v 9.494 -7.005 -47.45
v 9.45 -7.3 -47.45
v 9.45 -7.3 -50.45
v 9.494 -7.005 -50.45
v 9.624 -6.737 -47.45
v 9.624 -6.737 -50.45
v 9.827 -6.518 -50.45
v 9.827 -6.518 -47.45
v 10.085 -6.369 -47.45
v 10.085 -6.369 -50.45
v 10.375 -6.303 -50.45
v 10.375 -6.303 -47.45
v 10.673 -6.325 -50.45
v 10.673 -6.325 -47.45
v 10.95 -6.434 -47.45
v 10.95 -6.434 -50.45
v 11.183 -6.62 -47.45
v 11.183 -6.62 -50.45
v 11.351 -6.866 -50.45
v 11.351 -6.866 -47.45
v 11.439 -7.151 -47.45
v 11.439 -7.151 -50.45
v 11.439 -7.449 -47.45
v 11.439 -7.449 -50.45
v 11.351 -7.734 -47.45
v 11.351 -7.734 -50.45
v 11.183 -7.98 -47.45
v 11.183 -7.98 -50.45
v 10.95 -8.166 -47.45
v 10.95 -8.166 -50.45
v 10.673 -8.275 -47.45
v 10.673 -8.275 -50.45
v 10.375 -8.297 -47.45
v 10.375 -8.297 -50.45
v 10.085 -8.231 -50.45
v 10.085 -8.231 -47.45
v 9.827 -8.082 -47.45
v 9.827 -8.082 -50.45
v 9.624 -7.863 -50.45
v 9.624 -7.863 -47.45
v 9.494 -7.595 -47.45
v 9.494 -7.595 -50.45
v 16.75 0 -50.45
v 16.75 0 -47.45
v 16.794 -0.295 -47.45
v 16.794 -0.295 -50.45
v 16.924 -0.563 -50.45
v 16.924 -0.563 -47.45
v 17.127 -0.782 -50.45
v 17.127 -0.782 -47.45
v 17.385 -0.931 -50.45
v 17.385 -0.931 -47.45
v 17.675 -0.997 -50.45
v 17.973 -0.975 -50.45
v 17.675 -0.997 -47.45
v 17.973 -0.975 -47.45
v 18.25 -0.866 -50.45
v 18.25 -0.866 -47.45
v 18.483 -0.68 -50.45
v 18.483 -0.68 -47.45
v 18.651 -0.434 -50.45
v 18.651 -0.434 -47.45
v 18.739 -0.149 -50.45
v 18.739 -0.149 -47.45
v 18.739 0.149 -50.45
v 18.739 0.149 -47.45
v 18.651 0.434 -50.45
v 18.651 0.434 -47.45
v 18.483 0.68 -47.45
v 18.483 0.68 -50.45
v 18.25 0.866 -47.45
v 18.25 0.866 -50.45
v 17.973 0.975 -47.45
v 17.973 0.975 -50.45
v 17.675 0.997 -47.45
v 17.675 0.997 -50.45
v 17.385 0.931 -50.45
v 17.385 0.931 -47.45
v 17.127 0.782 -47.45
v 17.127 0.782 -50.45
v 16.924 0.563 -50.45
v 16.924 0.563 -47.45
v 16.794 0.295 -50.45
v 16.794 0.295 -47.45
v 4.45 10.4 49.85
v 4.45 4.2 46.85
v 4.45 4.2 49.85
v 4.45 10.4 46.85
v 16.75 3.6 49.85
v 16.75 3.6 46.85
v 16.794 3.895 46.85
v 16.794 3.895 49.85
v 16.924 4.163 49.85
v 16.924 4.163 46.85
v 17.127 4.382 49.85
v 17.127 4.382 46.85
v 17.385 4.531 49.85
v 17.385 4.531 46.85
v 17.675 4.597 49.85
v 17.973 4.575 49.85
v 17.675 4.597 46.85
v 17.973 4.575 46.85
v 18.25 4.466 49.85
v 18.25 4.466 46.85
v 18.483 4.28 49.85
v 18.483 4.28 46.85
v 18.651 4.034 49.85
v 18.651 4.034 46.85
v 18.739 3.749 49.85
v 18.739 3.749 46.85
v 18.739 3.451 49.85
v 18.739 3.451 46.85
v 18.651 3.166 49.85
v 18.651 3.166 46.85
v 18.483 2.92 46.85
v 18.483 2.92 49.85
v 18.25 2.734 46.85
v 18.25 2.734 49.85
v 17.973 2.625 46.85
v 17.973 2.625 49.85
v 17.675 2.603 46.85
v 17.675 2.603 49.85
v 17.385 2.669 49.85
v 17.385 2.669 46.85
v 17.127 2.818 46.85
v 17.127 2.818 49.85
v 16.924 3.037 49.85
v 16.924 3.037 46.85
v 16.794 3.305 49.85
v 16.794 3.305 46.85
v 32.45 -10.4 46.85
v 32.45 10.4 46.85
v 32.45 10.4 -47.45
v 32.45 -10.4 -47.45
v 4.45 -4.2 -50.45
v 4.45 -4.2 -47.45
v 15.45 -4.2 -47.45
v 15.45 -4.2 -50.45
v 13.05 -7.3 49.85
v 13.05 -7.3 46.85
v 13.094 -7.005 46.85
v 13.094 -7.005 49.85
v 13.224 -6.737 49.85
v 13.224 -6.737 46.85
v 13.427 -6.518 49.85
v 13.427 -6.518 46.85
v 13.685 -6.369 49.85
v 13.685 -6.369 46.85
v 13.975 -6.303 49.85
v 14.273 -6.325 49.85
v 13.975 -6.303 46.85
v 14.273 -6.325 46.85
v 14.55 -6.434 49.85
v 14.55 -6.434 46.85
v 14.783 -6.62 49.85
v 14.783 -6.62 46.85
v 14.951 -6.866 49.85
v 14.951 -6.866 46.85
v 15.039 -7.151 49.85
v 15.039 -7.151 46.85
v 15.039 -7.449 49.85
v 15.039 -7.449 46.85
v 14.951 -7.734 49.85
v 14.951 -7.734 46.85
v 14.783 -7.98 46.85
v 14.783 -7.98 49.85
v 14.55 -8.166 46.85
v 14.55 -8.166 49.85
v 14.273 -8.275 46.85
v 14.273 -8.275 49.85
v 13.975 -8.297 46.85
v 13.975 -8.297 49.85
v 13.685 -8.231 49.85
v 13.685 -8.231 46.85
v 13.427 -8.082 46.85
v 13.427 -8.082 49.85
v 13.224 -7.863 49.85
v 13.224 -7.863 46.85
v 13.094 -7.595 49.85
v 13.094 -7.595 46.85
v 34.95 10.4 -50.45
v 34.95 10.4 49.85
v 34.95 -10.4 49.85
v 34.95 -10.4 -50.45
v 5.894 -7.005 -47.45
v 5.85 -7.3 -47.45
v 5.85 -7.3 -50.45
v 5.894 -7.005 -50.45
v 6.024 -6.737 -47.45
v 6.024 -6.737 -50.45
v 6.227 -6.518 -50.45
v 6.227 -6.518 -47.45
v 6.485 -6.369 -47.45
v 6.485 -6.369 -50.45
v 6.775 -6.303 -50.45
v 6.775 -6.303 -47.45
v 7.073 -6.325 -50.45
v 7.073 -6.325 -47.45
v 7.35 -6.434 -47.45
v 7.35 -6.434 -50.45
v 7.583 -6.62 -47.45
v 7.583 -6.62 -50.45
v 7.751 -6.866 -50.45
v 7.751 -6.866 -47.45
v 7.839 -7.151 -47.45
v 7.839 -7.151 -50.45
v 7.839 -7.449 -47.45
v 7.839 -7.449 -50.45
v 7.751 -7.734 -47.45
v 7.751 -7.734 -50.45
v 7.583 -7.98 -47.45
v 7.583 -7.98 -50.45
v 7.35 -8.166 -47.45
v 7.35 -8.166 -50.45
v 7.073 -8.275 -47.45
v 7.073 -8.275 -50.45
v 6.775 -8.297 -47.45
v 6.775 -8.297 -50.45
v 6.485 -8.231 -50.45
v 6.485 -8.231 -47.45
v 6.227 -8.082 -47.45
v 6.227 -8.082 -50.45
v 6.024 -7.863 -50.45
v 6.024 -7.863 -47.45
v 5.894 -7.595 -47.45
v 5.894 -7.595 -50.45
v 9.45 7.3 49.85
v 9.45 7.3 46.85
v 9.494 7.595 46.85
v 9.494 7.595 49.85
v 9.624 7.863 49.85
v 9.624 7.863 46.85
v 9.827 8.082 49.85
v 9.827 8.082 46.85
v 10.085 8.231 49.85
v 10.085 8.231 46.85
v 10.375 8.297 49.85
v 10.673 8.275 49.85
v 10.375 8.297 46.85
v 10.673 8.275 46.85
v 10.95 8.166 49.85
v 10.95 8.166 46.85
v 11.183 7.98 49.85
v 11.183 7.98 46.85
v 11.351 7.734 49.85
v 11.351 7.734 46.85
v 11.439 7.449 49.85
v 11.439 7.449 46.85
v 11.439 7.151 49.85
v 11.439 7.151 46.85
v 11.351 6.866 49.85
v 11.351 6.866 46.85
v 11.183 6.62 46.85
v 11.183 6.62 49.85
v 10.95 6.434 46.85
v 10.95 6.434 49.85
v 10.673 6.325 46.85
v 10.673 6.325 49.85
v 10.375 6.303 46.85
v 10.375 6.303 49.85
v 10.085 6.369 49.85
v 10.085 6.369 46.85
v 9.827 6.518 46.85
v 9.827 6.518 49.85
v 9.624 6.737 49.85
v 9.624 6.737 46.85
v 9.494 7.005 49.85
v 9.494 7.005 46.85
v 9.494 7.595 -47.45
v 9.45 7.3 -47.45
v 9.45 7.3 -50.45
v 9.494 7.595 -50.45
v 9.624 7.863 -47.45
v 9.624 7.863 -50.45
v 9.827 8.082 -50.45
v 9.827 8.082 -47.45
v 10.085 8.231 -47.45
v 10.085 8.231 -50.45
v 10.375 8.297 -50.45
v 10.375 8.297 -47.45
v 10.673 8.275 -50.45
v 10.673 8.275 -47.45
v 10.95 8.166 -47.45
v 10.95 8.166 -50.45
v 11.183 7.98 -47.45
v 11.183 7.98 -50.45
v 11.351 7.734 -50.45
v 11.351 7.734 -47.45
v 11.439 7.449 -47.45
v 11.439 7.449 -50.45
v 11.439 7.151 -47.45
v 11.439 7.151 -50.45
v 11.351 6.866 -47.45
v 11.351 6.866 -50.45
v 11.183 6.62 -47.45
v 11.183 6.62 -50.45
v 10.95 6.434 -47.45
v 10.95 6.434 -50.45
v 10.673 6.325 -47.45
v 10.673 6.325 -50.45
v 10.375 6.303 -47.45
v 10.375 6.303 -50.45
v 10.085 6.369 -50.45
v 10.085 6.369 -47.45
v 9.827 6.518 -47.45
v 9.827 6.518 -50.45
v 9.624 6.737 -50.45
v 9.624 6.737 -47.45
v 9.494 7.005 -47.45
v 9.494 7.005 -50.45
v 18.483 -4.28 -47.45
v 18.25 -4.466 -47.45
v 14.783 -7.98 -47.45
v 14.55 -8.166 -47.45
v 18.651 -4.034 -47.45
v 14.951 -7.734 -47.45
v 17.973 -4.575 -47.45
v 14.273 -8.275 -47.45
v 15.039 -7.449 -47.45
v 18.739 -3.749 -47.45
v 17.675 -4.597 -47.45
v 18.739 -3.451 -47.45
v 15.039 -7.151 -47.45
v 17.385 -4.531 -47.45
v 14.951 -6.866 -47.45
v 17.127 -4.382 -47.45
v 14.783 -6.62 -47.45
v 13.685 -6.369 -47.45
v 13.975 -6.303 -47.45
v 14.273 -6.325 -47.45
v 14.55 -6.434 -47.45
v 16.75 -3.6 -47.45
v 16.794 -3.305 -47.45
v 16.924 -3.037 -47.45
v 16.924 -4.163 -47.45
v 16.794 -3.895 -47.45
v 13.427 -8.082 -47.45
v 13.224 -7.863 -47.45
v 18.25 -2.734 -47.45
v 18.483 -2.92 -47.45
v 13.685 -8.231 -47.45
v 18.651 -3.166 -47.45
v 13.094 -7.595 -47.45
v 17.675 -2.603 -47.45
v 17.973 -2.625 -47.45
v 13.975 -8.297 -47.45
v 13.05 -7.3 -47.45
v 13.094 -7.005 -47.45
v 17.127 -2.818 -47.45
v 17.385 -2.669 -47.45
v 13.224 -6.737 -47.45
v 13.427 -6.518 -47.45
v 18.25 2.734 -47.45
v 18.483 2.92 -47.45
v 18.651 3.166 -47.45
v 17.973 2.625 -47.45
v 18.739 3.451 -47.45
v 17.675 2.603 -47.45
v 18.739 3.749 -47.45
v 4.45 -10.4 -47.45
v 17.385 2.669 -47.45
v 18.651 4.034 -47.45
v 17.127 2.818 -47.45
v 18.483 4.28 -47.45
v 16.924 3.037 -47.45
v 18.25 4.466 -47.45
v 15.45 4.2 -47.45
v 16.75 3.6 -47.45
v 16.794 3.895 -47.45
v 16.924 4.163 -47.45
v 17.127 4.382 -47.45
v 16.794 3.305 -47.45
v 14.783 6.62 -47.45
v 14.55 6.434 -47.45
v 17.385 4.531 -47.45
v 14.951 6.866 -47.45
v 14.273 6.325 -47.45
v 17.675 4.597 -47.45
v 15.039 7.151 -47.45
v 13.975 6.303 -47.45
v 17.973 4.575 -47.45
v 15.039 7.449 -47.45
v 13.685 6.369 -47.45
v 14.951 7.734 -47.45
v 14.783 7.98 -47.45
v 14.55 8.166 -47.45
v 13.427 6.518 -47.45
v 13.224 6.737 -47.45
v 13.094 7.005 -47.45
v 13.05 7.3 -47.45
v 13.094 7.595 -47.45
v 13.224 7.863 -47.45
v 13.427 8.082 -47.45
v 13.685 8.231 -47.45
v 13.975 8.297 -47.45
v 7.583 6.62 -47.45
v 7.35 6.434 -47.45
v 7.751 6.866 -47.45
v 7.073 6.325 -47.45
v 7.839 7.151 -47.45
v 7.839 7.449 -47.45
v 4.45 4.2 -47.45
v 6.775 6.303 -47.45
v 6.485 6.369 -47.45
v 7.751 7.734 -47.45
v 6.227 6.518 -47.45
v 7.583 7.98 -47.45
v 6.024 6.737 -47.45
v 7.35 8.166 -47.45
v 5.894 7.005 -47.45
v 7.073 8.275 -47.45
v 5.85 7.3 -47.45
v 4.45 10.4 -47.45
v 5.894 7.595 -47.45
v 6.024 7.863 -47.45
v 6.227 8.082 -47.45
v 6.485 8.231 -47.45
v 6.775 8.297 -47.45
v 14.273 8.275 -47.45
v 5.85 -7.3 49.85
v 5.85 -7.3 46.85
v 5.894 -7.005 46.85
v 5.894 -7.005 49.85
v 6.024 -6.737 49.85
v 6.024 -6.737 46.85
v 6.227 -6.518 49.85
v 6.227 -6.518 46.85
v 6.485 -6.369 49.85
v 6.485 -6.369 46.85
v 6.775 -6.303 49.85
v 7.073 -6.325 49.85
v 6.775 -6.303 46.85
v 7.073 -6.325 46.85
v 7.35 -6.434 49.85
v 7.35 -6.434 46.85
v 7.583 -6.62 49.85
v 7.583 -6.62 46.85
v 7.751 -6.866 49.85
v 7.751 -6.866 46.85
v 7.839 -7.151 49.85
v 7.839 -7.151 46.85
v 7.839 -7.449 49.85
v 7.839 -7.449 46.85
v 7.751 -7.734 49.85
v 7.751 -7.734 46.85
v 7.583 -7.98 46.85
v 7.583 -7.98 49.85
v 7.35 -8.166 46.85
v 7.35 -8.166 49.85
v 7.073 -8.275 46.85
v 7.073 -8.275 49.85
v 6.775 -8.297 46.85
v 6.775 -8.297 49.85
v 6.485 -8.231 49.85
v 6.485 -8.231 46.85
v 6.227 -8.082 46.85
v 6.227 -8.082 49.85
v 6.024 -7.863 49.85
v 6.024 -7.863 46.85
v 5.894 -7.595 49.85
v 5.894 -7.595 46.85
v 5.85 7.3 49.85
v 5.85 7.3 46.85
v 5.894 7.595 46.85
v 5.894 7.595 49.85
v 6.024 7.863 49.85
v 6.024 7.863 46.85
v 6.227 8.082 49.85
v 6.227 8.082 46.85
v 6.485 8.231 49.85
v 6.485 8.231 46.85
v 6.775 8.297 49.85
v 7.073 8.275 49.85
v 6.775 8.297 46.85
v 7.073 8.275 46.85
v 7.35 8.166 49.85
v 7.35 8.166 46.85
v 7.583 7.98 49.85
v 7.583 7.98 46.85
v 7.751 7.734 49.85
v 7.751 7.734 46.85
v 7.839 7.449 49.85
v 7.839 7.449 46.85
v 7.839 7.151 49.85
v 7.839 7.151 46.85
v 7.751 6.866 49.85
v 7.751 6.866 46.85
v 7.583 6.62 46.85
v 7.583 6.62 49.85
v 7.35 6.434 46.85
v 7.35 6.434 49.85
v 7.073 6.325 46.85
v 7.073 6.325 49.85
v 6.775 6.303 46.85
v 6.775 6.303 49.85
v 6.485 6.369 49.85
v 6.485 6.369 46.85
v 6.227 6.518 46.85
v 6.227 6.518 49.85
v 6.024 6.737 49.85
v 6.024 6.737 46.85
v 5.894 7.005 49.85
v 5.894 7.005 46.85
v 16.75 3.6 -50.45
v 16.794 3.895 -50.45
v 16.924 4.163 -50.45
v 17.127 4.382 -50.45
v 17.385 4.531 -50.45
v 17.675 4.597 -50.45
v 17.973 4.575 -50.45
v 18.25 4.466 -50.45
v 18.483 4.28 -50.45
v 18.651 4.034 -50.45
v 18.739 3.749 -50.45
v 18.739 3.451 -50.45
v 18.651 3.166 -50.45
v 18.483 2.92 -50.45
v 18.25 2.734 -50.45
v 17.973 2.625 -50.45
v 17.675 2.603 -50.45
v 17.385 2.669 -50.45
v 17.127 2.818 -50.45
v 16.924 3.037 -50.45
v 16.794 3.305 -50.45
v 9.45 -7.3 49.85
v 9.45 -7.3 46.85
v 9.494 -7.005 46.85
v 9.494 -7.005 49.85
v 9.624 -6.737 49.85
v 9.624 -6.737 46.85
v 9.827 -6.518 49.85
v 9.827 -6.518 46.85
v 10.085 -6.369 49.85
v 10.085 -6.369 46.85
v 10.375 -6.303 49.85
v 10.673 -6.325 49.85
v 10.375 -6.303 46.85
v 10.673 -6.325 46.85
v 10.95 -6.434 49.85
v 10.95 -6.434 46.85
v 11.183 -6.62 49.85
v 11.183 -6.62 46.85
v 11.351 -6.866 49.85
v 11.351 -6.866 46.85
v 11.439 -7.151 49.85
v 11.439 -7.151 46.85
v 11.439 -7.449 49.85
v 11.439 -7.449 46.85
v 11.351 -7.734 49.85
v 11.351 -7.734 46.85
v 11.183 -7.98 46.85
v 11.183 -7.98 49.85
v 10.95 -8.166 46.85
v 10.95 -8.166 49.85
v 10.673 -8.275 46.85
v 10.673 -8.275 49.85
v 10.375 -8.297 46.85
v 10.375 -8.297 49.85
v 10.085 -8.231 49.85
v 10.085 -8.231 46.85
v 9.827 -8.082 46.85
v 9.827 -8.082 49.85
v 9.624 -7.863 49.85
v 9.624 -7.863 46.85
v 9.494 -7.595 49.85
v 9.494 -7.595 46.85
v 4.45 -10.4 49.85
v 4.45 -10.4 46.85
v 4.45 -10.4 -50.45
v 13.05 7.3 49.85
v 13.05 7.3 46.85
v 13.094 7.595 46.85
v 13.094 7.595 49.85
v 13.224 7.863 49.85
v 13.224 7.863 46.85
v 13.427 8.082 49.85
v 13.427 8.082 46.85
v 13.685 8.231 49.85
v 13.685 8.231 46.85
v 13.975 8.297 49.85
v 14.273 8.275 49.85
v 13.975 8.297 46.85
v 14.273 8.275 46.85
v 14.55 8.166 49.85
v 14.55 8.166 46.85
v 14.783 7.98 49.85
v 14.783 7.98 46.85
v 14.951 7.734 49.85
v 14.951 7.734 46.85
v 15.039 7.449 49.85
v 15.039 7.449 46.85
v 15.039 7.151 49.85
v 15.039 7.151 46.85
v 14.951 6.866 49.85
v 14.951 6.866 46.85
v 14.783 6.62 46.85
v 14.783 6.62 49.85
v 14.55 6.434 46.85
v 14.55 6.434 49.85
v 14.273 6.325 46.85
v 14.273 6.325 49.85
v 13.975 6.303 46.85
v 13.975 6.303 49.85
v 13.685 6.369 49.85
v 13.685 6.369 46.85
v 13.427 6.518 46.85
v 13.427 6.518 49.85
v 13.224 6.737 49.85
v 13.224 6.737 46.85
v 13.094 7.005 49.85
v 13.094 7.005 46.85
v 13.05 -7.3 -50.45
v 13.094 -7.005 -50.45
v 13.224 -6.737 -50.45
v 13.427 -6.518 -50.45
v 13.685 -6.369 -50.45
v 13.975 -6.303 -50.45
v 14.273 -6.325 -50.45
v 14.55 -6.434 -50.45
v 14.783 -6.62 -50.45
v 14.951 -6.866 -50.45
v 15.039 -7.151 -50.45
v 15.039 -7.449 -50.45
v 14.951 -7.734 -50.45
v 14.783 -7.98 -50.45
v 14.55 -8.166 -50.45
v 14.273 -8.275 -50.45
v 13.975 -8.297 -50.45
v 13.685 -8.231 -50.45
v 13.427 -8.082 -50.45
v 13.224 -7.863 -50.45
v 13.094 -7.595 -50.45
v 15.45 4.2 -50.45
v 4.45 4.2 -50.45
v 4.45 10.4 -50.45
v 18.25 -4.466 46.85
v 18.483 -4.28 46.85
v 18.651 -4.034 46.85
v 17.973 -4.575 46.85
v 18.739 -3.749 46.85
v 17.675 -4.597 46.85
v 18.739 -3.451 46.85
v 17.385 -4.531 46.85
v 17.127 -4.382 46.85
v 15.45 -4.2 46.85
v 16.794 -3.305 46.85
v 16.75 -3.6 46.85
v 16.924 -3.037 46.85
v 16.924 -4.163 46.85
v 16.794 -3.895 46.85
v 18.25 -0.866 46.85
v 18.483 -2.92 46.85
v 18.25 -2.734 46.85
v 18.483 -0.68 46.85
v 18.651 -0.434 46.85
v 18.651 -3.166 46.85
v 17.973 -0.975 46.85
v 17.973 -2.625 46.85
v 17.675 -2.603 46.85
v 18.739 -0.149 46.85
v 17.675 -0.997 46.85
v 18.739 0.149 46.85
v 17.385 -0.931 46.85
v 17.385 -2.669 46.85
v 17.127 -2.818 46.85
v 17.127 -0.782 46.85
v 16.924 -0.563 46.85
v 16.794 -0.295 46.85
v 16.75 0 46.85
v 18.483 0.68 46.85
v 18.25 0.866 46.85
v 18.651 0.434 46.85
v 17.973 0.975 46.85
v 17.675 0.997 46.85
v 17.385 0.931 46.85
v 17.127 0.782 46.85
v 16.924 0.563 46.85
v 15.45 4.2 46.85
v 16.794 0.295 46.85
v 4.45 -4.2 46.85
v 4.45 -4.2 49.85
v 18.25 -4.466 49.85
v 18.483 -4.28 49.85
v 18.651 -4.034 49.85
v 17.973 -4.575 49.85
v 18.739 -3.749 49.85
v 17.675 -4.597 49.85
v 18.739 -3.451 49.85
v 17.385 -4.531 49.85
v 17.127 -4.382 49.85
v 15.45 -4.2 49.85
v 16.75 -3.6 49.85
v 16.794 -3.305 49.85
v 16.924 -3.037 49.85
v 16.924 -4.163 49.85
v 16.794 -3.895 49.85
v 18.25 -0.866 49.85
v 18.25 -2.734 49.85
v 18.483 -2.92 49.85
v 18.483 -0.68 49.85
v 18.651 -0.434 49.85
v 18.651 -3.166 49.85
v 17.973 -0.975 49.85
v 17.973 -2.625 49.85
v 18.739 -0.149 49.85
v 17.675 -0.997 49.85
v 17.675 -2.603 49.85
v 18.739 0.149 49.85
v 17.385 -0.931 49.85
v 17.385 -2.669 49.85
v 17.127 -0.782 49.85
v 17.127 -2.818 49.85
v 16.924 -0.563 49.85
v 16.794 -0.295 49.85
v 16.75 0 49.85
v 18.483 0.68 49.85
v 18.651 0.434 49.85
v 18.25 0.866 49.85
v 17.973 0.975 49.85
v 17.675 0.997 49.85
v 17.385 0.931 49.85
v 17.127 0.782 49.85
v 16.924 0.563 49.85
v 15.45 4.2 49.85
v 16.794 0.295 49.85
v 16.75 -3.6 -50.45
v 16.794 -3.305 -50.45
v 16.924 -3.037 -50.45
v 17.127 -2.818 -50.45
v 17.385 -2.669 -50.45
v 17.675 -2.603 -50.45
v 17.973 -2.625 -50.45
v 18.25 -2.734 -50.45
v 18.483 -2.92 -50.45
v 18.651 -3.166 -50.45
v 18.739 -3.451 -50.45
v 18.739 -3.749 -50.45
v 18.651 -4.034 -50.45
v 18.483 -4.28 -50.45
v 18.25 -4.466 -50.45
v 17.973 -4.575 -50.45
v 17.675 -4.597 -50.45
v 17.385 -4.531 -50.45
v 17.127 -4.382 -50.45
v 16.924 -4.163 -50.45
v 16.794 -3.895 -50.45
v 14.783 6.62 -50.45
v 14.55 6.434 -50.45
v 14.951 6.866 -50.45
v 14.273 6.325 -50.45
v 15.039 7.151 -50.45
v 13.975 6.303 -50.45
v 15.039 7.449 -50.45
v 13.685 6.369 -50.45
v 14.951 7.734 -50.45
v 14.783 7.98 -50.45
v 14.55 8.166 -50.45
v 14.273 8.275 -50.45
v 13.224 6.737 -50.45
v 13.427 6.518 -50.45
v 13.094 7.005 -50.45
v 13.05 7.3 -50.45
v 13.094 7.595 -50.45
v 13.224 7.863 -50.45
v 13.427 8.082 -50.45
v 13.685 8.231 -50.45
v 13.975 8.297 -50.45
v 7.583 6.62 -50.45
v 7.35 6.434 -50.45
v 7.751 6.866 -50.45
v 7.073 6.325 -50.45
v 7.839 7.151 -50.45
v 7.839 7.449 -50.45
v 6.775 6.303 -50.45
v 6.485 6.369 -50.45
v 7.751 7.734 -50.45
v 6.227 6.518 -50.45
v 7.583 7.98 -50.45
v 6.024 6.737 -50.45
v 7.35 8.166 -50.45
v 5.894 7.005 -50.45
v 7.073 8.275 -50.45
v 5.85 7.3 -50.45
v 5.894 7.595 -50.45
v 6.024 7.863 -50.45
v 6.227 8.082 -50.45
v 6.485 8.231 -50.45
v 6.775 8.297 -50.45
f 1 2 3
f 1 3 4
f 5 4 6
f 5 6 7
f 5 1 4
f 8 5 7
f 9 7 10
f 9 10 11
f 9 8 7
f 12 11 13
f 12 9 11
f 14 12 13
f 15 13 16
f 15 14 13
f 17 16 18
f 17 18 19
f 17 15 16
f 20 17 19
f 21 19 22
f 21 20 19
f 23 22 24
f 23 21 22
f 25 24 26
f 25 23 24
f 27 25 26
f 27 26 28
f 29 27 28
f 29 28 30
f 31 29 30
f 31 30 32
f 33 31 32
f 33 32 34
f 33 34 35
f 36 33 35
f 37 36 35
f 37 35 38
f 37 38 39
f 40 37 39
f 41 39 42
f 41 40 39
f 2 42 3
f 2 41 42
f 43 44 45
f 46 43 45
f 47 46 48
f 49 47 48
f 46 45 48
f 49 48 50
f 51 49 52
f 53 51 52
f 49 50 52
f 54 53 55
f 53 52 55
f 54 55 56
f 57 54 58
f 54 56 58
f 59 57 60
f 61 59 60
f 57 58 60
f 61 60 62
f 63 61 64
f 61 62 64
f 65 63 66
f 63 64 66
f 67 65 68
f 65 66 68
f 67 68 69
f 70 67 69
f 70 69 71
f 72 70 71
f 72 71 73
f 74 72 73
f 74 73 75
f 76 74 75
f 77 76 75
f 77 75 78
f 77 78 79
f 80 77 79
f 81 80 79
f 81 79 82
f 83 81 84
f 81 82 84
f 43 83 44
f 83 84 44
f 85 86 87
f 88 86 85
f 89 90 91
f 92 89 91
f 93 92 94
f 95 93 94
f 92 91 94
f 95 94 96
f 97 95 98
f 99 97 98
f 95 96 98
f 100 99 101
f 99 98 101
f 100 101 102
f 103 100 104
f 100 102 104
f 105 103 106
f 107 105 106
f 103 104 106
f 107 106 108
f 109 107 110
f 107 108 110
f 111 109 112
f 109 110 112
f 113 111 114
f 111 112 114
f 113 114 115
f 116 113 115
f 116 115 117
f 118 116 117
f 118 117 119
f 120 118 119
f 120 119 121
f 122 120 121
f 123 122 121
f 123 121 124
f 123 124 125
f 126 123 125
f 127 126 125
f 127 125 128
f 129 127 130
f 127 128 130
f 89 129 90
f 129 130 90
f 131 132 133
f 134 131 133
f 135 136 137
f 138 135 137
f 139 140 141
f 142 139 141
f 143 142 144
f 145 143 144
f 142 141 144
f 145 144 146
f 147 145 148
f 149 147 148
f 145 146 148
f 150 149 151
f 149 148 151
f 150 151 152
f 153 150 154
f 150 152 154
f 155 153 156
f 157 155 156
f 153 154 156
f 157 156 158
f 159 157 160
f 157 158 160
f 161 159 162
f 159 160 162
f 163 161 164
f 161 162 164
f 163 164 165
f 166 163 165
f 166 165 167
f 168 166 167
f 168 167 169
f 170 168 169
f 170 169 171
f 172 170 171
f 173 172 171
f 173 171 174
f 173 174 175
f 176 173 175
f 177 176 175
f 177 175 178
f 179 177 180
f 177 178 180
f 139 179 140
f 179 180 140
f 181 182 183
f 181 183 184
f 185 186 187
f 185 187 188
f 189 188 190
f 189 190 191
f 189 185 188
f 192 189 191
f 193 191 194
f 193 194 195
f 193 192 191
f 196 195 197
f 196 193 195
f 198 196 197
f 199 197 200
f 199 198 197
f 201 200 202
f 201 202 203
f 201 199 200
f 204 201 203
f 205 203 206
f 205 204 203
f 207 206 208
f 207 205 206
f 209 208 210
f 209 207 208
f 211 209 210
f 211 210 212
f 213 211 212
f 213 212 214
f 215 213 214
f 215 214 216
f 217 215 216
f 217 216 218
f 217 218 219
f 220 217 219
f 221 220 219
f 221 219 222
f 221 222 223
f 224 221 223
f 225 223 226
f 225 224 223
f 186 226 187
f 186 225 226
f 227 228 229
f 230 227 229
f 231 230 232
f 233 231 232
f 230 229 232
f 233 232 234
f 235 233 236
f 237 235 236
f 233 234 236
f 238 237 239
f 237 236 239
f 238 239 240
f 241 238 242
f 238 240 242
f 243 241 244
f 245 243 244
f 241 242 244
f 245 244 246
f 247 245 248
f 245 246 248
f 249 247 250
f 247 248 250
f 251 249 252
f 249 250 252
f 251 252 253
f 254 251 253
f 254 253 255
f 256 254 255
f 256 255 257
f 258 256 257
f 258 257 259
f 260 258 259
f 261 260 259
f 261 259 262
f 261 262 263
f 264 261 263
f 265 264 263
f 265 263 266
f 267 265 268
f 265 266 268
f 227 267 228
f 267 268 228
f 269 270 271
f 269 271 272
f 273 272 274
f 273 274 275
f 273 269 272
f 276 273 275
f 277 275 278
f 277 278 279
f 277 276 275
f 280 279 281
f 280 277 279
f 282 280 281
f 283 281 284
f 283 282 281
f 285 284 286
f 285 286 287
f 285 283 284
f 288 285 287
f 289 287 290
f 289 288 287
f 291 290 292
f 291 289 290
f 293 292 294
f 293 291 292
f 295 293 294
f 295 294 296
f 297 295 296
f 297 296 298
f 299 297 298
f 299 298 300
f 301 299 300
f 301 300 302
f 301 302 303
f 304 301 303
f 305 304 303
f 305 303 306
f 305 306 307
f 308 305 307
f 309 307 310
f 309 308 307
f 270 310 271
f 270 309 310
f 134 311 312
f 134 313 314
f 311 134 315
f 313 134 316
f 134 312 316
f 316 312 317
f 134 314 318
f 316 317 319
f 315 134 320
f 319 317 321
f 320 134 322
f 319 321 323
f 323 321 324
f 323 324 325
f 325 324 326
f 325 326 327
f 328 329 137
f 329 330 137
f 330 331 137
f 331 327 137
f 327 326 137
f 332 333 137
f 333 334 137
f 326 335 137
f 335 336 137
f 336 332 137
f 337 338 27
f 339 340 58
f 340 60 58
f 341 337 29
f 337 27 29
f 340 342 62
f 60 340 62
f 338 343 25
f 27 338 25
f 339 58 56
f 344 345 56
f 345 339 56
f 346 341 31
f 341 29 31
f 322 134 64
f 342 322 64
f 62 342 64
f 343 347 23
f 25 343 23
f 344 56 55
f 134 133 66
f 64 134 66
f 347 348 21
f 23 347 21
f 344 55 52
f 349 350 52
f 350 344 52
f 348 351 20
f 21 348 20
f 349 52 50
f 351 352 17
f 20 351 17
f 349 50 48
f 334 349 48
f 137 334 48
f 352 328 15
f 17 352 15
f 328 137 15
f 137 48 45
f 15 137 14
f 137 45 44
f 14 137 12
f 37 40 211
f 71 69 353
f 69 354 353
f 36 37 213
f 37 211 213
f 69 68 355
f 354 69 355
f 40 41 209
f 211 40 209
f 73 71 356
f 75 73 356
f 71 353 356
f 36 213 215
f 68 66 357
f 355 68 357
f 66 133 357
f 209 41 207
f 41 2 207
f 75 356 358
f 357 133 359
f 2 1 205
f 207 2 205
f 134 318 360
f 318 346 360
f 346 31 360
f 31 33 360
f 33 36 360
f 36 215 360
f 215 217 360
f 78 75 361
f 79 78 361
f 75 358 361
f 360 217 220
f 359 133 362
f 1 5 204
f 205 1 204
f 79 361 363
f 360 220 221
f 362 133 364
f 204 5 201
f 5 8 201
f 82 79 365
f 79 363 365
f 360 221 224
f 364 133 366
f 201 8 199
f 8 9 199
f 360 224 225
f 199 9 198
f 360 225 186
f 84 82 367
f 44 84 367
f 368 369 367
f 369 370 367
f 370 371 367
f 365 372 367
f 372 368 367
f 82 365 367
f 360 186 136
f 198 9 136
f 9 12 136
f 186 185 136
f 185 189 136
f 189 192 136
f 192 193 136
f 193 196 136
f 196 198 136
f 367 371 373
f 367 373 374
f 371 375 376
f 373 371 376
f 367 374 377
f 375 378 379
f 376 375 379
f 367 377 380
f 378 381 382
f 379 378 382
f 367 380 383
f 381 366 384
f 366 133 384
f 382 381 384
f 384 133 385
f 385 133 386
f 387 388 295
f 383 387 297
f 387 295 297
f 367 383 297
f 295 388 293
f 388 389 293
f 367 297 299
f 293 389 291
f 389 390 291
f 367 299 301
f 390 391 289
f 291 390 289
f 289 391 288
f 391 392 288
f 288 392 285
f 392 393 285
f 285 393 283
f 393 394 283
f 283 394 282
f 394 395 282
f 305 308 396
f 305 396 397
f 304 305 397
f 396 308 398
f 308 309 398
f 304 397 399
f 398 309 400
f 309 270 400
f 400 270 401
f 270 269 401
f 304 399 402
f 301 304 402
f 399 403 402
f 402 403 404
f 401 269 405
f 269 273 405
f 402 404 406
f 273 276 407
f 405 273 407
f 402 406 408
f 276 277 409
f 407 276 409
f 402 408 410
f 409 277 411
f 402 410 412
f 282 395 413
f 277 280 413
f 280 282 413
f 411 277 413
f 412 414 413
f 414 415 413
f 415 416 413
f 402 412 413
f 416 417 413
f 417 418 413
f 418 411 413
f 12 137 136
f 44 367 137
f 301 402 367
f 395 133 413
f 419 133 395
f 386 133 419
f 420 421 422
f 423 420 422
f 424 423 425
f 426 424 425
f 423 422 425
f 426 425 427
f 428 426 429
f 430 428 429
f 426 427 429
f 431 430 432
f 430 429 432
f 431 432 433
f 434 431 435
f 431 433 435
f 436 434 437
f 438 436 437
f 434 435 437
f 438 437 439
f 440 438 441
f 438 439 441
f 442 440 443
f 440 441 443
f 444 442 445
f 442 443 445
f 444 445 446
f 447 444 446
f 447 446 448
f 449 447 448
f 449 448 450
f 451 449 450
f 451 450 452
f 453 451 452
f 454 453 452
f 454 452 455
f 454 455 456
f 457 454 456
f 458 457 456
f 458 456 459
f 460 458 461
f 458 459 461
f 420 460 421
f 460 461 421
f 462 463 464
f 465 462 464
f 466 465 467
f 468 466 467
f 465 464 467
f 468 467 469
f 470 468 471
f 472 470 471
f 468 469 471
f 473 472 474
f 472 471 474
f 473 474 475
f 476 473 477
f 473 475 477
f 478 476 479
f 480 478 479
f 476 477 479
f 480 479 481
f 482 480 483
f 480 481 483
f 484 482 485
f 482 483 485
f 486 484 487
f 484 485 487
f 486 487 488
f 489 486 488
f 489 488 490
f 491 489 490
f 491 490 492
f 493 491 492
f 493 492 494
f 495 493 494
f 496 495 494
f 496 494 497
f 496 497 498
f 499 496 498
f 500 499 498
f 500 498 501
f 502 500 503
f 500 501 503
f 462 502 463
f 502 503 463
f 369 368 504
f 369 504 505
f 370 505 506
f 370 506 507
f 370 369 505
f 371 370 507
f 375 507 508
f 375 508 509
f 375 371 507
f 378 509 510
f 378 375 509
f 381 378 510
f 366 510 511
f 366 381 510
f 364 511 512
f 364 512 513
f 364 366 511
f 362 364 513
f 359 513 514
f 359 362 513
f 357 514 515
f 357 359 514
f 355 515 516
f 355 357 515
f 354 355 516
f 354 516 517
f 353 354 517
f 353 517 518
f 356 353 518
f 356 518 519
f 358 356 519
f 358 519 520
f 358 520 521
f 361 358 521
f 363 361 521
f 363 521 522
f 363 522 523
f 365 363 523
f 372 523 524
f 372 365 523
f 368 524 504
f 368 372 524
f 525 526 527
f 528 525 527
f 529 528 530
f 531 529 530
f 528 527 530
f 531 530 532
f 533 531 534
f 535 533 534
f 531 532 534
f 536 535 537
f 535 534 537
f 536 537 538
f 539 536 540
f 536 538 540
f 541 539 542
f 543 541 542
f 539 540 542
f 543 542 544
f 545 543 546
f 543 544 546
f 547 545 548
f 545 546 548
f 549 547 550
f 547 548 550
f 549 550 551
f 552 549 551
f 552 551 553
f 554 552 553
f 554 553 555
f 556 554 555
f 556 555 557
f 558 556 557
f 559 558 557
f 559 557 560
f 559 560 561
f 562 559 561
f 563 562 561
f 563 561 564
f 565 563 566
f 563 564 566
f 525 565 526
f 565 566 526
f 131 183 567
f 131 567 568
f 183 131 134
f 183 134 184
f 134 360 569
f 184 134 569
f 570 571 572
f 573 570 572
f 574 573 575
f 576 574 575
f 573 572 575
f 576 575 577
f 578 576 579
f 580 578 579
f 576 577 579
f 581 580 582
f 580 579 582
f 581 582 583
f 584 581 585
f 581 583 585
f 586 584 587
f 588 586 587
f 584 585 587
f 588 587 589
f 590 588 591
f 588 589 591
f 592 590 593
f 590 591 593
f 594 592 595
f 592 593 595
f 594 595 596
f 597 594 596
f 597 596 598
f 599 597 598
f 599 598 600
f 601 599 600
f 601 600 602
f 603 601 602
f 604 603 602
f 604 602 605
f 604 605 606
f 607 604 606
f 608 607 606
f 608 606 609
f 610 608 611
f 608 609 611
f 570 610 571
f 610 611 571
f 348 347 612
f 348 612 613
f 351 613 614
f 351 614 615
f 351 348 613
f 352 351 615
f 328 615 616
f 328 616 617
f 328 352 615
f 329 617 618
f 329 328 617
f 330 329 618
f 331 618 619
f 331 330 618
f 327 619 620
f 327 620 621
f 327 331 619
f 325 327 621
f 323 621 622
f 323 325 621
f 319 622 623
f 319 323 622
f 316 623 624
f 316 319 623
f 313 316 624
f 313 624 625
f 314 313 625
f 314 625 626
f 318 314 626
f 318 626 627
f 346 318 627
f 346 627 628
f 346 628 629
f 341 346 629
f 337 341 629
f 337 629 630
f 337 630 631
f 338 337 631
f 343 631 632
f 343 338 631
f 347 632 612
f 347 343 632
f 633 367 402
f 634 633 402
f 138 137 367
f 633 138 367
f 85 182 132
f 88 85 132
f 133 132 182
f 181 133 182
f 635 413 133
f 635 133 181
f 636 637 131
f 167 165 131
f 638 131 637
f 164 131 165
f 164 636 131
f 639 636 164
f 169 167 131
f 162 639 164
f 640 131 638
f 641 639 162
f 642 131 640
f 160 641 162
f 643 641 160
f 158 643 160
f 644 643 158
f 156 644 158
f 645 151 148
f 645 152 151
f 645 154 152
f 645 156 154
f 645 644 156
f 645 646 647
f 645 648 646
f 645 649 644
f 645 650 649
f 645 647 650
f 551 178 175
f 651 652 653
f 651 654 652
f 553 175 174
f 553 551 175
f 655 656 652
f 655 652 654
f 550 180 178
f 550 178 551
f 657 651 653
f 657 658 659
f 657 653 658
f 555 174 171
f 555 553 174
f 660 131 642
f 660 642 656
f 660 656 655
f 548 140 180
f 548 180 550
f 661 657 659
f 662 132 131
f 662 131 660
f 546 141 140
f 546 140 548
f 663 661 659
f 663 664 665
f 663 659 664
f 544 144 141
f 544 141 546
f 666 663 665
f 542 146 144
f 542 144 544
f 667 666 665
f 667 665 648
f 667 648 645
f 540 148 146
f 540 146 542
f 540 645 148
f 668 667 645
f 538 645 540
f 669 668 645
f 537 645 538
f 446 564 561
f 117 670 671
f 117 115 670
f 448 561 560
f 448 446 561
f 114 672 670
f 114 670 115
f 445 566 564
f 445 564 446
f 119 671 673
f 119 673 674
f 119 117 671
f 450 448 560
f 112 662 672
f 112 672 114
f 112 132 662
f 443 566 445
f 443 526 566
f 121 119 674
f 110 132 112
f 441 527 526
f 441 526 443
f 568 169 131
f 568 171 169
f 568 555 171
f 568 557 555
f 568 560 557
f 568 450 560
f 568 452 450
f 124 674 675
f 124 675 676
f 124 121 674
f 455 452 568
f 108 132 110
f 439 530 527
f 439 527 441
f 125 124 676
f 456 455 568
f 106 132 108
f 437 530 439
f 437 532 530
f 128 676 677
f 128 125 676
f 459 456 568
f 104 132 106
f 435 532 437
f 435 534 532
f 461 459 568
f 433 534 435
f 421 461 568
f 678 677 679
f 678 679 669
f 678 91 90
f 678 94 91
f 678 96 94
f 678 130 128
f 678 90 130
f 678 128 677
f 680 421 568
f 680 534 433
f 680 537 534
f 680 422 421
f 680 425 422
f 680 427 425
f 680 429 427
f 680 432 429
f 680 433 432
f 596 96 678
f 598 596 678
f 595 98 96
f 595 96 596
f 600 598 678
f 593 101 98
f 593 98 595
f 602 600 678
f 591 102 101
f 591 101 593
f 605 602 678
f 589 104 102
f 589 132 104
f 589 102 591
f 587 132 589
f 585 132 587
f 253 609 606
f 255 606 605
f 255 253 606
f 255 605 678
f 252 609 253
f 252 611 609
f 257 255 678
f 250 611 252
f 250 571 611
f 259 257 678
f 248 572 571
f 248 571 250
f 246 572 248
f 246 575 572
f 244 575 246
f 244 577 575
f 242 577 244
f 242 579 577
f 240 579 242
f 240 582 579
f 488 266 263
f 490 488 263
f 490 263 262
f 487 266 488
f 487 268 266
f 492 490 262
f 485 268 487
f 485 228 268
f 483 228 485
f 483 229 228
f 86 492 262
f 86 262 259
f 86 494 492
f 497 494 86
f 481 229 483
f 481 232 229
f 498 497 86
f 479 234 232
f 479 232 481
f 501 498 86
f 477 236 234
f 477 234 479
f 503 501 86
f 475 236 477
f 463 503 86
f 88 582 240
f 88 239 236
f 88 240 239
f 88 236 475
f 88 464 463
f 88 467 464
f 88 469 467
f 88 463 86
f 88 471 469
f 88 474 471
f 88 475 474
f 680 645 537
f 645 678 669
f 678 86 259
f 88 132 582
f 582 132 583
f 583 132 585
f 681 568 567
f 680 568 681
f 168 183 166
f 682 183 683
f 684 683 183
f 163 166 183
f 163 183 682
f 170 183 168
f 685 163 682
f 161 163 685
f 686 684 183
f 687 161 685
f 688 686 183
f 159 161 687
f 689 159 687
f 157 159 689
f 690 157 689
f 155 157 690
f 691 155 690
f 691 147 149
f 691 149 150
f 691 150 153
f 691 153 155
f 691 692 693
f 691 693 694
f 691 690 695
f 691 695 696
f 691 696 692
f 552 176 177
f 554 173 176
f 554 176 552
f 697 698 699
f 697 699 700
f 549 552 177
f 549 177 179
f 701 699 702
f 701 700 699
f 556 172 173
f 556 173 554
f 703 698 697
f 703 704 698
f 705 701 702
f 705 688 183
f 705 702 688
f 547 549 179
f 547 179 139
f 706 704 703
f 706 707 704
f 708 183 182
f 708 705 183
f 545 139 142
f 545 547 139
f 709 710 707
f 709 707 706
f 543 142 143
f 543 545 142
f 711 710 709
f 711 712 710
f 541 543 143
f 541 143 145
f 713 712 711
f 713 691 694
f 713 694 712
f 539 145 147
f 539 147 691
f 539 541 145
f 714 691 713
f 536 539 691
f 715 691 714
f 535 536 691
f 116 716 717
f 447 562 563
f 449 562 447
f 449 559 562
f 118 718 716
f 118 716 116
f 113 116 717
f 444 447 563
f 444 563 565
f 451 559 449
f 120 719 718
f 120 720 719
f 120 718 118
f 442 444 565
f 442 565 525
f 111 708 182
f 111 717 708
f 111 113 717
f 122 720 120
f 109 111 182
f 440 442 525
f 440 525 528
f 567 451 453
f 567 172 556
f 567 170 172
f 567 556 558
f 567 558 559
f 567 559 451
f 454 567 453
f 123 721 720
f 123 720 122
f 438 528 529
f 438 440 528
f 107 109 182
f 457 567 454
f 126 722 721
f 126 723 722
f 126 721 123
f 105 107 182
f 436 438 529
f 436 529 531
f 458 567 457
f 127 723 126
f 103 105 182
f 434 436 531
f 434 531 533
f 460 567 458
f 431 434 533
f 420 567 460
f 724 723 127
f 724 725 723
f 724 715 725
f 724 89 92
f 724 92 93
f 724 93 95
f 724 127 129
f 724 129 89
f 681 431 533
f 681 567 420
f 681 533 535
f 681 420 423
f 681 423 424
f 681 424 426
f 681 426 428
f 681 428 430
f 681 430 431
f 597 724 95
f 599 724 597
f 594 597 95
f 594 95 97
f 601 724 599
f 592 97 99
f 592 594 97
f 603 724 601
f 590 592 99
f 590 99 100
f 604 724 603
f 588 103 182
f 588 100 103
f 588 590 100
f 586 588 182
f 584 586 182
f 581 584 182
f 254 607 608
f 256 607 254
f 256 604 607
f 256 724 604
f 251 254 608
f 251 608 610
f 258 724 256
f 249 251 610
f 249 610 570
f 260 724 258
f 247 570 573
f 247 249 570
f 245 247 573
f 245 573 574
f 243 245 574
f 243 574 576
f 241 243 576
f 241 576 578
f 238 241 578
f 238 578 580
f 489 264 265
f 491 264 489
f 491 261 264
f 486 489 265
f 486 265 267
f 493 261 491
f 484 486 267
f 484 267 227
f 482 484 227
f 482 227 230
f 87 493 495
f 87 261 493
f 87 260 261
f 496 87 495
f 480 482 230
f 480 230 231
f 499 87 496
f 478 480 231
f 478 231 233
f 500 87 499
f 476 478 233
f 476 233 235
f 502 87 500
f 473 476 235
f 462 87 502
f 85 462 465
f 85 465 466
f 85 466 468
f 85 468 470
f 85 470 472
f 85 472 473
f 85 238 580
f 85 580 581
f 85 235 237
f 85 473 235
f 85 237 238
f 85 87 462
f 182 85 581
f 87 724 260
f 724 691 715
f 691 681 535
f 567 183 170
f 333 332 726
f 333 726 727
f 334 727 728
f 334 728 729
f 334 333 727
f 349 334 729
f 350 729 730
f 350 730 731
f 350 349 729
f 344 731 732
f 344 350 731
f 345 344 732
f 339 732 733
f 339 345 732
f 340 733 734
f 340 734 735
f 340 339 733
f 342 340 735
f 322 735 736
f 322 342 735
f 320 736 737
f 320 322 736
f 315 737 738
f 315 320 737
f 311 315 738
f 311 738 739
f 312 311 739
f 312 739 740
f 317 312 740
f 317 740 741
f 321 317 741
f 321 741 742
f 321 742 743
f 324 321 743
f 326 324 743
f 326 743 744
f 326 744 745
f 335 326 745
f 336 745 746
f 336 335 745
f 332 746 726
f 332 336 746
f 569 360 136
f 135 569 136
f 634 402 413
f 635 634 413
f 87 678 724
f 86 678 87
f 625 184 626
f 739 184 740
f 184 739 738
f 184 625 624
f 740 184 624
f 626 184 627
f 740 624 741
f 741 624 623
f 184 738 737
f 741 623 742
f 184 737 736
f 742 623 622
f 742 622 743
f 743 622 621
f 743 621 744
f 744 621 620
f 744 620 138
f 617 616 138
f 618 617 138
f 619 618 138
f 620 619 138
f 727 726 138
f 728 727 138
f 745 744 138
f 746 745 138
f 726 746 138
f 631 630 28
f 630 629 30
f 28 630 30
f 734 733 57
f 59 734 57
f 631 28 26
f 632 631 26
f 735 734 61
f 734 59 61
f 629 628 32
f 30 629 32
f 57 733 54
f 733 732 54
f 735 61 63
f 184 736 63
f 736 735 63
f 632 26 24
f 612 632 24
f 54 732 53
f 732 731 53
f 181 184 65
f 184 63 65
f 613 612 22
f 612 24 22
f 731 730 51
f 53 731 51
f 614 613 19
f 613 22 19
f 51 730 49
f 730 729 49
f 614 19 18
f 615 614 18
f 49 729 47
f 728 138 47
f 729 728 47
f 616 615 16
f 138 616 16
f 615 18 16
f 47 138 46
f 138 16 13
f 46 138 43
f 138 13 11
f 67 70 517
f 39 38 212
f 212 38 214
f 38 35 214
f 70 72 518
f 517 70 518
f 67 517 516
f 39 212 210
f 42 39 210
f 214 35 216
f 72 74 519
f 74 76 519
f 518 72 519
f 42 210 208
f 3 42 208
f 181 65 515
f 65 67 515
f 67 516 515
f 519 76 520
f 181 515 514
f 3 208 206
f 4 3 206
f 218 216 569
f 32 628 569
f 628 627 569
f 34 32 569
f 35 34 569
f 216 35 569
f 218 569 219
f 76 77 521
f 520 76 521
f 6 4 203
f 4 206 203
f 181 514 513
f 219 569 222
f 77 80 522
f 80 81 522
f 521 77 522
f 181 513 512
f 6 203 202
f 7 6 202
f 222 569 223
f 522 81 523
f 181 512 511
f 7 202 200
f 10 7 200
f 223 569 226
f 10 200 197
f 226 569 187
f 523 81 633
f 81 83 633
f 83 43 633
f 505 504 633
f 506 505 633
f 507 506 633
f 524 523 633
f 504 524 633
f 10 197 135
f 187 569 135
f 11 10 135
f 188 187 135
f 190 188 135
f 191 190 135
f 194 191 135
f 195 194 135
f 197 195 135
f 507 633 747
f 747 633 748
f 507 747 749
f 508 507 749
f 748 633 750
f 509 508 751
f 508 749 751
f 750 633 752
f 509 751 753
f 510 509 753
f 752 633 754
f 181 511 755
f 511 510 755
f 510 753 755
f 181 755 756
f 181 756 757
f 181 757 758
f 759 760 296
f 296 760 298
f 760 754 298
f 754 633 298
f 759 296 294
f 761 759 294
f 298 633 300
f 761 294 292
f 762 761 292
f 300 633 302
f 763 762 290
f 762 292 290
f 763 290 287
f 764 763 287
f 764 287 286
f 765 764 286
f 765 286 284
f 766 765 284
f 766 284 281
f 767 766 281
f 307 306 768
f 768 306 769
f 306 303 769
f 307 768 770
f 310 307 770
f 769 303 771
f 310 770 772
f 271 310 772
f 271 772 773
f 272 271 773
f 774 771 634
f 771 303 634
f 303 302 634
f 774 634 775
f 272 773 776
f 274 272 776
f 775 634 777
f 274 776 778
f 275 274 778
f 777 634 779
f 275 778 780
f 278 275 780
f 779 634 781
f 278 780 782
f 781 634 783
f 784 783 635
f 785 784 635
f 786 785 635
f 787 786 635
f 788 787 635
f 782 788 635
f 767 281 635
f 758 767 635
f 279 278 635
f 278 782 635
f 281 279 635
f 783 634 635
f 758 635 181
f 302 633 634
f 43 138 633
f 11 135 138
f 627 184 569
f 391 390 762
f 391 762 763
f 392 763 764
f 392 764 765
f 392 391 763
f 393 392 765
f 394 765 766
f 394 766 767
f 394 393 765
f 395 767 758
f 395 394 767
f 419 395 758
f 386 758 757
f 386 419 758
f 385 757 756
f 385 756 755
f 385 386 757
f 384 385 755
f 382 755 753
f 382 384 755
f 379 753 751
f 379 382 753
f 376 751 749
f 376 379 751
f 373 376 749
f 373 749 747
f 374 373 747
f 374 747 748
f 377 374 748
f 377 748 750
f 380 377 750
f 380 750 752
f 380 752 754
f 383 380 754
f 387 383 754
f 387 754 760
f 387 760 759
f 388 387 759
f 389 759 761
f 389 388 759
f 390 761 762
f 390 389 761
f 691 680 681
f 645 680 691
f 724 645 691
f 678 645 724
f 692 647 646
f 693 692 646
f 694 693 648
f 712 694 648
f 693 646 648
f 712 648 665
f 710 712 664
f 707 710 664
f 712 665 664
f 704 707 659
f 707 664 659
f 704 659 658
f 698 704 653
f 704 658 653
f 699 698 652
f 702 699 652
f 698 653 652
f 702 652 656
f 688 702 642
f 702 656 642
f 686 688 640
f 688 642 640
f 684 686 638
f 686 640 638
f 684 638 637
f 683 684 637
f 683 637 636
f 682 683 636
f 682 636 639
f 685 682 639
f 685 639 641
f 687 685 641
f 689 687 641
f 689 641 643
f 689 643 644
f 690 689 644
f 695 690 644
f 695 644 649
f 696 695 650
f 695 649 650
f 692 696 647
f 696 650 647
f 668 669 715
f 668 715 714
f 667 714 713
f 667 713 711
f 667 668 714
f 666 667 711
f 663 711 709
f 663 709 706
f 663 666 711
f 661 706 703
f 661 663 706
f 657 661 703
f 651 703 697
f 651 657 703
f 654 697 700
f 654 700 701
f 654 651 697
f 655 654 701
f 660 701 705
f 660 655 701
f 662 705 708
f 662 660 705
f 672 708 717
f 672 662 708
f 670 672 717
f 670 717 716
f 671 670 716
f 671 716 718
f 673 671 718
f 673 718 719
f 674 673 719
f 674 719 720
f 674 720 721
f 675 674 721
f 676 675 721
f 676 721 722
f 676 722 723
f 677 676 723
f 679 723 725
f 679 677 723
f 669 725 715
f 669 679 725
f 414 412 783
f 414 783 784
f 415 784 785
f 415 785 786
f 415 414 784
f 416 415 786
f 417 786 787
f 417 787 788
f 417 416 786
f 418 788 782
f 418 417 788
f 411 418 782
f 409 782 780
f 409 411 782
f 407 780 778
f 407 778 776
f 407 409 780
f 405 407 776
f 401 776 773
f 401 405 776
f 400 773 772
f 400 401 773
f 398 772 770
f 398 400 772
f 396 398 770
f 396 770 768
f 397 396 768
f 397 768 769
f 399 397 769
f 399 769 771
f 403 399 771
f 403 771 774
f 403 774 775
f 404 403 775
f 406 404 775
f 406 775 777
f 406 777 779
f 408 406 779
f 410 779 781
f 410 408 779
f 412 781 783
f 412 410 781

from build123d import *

# Parameters (mm, degrees)
SKETCH_3_R      = 1
EXTRUDE_2_DEPTH = 3
SKETCH_5_W      = 100.3
SKETCH_5_H      = 20.8
EXTRUDE_4_DEPTH = 2.5


with BuildPart() as part:
    # 스케치3 → 보스-돌출2 (new body)
    with BuildSketch(Plane(origin=(0, 0, -47.45), x_dir=(-1, 0, 0), z_dir=(0, 0, -1))):
        with BuildLine():
            ThreePointArc((-20.85, 0), (-17.803910524, 7.353910524), (-10.45, 10.4))
            Line((-10.45, 10.4), (-20.85, 10.4))
            Line((-20.85, 10.4), (-32.45, 10.4))
            Line((-32.45, 10.4), (-32.45, 0))
            Line((-32.45, 0), (-20.85, 0))
        make_face()
        with BuildLine():
            Line((-20.85, -10.4), (-10.45, -10.4))
            ThreePointArc((-10.45, -10.4), (-17.803910524, -7.353910524), (-20.85, 0))
            Line((-20.85, 0), (-32.45, 0))
            Line((-32.45, 0), (-32.45, -10.4))
            Line((-32.45, -10.4), (-20.85, -10.4))
        make_face()
        with BuildLine():
            Line((-16.75, 0), (-15.45, 0))
            Line((-15.45, 0), (-15.45, 4.2))
            Line((-15.45, 4.2), (-4.45, 4.2))
            Line((-4.45, 4.2), (-4.45, 8.494704233))
            ThreePointArc((-4.45, 8.494704233), (-7.302375818, 9.912237992), (-10.45, 10.4))
            ThreePointArc((-10.45, 10.4), (-17.803910524, 7.353910524), (-20.85, 0))
            Line((-20.85, 0), (-18.75, 0))
            ThreePointArc((-18.75, 0), (-17.75, 1), (-16.75, 0))
        make_face()
        with Locations((-17.75, 3.6)):
            Circle(SKETCH_3_R, mode=Mode.SUBTRACT)
        with Locations((-14.05, 7.3)):
            Circle(SKETCH_3_R, mode=Mode.SUBTRACT)
        with Locations((-10.45, 7.3)):
            Circle(SKETCH_3_R, mode=Mode.SUBTRACT)
        with Locations((-6.85, 7.3)):
            Circle(SKETCH_3_R, mode=Mode.SUBTRACT)
        with BuildLine():
            Line((-15.45, -4.2), (-15.45, 0))
            Line((-15.45, 0), (-16.75, 0))
            ThreePointArc((-16.75, 0), (-17.75, -1), (-18.75, 0))
            Line((-18.75, 0), (-20.85, 0))
            ThreePointArc((-20.85, 0), (-17.803910524, -7.353910524), (-10.45, -10.4))
            ThreePointArc((-10.45, -10.4), (-7.302375818, -9.912237992), (-4.45, -8.494704233))
            Line((-4.45, -8.494704233), (-4.45, -4.2))
            Line((-4.45, -4.2), (-15.45, -4.2))
        make_face()
        with Locations((-17.75, -3.6)):
            Circle(SKETCH_3_R, mode=Mode.SUBTRACT)
        with Locations((-14.05, -7.3)):
            Circle(SKETCH_3_R, mode=Mode.SUBTRACT)
        with Locations((-10.45, -7.3)):
            Circle(SKETCH_3_R, mode=Mode.SUBTRACT)
        with Locations((-6.85, -7.3)):
            Circle(SKETCH_3_R, mode=Mode.SUBTRACT)
        with BuildLine():
            ThreePointArc((-10.45, 10.4), (-7.302375818, 9.912237992), (-4.45, 8.494704233))
            Line((-4.45, 8.494704233), (-4.45, 10.4))
            Line((-4.45, 10.4), (-10.45, 10.4))
        make_face()
        with BuildLine():
            Line((-4.45, -10.4), (-4.45, -8.494704233))
            ThreePointArc((-4.45, -8.494704233), (-7.302375818, -9.912237992), (-10.45, -10.4))
            Line((-10.45, -10.4), (-4.45, -10.4))
        make_face()
    extrude(amount=EXTRUDE_2_DEPTH)


with BuildPart() as body_2:
    # 대칭 복사7: mirrored copy
    add(part.part.mirror(Plane(origin=(0, 0, -0.3), x_dir=(1, 0, 0), z_dir=(0, 0, -1))))


with BuildPart() as part_1:
    add(part.part)

    add(body_2.part)  # 보스-돌출4 merges body 2
    # 스케치5 → 보스-돌출4 (add)
    with BuildSketch(Plane(origin=(32.45, 0, 0), x_dir=(0, 0, -1), z_dir=(1, 0, 0))):
        with Locations((0.3, 0)):
            Rectangle(SKETCH_5_W, SKETCH_5_H)
    extrude(amount=EXTRUDE_4_DEPTH)


solid = part_1.part
